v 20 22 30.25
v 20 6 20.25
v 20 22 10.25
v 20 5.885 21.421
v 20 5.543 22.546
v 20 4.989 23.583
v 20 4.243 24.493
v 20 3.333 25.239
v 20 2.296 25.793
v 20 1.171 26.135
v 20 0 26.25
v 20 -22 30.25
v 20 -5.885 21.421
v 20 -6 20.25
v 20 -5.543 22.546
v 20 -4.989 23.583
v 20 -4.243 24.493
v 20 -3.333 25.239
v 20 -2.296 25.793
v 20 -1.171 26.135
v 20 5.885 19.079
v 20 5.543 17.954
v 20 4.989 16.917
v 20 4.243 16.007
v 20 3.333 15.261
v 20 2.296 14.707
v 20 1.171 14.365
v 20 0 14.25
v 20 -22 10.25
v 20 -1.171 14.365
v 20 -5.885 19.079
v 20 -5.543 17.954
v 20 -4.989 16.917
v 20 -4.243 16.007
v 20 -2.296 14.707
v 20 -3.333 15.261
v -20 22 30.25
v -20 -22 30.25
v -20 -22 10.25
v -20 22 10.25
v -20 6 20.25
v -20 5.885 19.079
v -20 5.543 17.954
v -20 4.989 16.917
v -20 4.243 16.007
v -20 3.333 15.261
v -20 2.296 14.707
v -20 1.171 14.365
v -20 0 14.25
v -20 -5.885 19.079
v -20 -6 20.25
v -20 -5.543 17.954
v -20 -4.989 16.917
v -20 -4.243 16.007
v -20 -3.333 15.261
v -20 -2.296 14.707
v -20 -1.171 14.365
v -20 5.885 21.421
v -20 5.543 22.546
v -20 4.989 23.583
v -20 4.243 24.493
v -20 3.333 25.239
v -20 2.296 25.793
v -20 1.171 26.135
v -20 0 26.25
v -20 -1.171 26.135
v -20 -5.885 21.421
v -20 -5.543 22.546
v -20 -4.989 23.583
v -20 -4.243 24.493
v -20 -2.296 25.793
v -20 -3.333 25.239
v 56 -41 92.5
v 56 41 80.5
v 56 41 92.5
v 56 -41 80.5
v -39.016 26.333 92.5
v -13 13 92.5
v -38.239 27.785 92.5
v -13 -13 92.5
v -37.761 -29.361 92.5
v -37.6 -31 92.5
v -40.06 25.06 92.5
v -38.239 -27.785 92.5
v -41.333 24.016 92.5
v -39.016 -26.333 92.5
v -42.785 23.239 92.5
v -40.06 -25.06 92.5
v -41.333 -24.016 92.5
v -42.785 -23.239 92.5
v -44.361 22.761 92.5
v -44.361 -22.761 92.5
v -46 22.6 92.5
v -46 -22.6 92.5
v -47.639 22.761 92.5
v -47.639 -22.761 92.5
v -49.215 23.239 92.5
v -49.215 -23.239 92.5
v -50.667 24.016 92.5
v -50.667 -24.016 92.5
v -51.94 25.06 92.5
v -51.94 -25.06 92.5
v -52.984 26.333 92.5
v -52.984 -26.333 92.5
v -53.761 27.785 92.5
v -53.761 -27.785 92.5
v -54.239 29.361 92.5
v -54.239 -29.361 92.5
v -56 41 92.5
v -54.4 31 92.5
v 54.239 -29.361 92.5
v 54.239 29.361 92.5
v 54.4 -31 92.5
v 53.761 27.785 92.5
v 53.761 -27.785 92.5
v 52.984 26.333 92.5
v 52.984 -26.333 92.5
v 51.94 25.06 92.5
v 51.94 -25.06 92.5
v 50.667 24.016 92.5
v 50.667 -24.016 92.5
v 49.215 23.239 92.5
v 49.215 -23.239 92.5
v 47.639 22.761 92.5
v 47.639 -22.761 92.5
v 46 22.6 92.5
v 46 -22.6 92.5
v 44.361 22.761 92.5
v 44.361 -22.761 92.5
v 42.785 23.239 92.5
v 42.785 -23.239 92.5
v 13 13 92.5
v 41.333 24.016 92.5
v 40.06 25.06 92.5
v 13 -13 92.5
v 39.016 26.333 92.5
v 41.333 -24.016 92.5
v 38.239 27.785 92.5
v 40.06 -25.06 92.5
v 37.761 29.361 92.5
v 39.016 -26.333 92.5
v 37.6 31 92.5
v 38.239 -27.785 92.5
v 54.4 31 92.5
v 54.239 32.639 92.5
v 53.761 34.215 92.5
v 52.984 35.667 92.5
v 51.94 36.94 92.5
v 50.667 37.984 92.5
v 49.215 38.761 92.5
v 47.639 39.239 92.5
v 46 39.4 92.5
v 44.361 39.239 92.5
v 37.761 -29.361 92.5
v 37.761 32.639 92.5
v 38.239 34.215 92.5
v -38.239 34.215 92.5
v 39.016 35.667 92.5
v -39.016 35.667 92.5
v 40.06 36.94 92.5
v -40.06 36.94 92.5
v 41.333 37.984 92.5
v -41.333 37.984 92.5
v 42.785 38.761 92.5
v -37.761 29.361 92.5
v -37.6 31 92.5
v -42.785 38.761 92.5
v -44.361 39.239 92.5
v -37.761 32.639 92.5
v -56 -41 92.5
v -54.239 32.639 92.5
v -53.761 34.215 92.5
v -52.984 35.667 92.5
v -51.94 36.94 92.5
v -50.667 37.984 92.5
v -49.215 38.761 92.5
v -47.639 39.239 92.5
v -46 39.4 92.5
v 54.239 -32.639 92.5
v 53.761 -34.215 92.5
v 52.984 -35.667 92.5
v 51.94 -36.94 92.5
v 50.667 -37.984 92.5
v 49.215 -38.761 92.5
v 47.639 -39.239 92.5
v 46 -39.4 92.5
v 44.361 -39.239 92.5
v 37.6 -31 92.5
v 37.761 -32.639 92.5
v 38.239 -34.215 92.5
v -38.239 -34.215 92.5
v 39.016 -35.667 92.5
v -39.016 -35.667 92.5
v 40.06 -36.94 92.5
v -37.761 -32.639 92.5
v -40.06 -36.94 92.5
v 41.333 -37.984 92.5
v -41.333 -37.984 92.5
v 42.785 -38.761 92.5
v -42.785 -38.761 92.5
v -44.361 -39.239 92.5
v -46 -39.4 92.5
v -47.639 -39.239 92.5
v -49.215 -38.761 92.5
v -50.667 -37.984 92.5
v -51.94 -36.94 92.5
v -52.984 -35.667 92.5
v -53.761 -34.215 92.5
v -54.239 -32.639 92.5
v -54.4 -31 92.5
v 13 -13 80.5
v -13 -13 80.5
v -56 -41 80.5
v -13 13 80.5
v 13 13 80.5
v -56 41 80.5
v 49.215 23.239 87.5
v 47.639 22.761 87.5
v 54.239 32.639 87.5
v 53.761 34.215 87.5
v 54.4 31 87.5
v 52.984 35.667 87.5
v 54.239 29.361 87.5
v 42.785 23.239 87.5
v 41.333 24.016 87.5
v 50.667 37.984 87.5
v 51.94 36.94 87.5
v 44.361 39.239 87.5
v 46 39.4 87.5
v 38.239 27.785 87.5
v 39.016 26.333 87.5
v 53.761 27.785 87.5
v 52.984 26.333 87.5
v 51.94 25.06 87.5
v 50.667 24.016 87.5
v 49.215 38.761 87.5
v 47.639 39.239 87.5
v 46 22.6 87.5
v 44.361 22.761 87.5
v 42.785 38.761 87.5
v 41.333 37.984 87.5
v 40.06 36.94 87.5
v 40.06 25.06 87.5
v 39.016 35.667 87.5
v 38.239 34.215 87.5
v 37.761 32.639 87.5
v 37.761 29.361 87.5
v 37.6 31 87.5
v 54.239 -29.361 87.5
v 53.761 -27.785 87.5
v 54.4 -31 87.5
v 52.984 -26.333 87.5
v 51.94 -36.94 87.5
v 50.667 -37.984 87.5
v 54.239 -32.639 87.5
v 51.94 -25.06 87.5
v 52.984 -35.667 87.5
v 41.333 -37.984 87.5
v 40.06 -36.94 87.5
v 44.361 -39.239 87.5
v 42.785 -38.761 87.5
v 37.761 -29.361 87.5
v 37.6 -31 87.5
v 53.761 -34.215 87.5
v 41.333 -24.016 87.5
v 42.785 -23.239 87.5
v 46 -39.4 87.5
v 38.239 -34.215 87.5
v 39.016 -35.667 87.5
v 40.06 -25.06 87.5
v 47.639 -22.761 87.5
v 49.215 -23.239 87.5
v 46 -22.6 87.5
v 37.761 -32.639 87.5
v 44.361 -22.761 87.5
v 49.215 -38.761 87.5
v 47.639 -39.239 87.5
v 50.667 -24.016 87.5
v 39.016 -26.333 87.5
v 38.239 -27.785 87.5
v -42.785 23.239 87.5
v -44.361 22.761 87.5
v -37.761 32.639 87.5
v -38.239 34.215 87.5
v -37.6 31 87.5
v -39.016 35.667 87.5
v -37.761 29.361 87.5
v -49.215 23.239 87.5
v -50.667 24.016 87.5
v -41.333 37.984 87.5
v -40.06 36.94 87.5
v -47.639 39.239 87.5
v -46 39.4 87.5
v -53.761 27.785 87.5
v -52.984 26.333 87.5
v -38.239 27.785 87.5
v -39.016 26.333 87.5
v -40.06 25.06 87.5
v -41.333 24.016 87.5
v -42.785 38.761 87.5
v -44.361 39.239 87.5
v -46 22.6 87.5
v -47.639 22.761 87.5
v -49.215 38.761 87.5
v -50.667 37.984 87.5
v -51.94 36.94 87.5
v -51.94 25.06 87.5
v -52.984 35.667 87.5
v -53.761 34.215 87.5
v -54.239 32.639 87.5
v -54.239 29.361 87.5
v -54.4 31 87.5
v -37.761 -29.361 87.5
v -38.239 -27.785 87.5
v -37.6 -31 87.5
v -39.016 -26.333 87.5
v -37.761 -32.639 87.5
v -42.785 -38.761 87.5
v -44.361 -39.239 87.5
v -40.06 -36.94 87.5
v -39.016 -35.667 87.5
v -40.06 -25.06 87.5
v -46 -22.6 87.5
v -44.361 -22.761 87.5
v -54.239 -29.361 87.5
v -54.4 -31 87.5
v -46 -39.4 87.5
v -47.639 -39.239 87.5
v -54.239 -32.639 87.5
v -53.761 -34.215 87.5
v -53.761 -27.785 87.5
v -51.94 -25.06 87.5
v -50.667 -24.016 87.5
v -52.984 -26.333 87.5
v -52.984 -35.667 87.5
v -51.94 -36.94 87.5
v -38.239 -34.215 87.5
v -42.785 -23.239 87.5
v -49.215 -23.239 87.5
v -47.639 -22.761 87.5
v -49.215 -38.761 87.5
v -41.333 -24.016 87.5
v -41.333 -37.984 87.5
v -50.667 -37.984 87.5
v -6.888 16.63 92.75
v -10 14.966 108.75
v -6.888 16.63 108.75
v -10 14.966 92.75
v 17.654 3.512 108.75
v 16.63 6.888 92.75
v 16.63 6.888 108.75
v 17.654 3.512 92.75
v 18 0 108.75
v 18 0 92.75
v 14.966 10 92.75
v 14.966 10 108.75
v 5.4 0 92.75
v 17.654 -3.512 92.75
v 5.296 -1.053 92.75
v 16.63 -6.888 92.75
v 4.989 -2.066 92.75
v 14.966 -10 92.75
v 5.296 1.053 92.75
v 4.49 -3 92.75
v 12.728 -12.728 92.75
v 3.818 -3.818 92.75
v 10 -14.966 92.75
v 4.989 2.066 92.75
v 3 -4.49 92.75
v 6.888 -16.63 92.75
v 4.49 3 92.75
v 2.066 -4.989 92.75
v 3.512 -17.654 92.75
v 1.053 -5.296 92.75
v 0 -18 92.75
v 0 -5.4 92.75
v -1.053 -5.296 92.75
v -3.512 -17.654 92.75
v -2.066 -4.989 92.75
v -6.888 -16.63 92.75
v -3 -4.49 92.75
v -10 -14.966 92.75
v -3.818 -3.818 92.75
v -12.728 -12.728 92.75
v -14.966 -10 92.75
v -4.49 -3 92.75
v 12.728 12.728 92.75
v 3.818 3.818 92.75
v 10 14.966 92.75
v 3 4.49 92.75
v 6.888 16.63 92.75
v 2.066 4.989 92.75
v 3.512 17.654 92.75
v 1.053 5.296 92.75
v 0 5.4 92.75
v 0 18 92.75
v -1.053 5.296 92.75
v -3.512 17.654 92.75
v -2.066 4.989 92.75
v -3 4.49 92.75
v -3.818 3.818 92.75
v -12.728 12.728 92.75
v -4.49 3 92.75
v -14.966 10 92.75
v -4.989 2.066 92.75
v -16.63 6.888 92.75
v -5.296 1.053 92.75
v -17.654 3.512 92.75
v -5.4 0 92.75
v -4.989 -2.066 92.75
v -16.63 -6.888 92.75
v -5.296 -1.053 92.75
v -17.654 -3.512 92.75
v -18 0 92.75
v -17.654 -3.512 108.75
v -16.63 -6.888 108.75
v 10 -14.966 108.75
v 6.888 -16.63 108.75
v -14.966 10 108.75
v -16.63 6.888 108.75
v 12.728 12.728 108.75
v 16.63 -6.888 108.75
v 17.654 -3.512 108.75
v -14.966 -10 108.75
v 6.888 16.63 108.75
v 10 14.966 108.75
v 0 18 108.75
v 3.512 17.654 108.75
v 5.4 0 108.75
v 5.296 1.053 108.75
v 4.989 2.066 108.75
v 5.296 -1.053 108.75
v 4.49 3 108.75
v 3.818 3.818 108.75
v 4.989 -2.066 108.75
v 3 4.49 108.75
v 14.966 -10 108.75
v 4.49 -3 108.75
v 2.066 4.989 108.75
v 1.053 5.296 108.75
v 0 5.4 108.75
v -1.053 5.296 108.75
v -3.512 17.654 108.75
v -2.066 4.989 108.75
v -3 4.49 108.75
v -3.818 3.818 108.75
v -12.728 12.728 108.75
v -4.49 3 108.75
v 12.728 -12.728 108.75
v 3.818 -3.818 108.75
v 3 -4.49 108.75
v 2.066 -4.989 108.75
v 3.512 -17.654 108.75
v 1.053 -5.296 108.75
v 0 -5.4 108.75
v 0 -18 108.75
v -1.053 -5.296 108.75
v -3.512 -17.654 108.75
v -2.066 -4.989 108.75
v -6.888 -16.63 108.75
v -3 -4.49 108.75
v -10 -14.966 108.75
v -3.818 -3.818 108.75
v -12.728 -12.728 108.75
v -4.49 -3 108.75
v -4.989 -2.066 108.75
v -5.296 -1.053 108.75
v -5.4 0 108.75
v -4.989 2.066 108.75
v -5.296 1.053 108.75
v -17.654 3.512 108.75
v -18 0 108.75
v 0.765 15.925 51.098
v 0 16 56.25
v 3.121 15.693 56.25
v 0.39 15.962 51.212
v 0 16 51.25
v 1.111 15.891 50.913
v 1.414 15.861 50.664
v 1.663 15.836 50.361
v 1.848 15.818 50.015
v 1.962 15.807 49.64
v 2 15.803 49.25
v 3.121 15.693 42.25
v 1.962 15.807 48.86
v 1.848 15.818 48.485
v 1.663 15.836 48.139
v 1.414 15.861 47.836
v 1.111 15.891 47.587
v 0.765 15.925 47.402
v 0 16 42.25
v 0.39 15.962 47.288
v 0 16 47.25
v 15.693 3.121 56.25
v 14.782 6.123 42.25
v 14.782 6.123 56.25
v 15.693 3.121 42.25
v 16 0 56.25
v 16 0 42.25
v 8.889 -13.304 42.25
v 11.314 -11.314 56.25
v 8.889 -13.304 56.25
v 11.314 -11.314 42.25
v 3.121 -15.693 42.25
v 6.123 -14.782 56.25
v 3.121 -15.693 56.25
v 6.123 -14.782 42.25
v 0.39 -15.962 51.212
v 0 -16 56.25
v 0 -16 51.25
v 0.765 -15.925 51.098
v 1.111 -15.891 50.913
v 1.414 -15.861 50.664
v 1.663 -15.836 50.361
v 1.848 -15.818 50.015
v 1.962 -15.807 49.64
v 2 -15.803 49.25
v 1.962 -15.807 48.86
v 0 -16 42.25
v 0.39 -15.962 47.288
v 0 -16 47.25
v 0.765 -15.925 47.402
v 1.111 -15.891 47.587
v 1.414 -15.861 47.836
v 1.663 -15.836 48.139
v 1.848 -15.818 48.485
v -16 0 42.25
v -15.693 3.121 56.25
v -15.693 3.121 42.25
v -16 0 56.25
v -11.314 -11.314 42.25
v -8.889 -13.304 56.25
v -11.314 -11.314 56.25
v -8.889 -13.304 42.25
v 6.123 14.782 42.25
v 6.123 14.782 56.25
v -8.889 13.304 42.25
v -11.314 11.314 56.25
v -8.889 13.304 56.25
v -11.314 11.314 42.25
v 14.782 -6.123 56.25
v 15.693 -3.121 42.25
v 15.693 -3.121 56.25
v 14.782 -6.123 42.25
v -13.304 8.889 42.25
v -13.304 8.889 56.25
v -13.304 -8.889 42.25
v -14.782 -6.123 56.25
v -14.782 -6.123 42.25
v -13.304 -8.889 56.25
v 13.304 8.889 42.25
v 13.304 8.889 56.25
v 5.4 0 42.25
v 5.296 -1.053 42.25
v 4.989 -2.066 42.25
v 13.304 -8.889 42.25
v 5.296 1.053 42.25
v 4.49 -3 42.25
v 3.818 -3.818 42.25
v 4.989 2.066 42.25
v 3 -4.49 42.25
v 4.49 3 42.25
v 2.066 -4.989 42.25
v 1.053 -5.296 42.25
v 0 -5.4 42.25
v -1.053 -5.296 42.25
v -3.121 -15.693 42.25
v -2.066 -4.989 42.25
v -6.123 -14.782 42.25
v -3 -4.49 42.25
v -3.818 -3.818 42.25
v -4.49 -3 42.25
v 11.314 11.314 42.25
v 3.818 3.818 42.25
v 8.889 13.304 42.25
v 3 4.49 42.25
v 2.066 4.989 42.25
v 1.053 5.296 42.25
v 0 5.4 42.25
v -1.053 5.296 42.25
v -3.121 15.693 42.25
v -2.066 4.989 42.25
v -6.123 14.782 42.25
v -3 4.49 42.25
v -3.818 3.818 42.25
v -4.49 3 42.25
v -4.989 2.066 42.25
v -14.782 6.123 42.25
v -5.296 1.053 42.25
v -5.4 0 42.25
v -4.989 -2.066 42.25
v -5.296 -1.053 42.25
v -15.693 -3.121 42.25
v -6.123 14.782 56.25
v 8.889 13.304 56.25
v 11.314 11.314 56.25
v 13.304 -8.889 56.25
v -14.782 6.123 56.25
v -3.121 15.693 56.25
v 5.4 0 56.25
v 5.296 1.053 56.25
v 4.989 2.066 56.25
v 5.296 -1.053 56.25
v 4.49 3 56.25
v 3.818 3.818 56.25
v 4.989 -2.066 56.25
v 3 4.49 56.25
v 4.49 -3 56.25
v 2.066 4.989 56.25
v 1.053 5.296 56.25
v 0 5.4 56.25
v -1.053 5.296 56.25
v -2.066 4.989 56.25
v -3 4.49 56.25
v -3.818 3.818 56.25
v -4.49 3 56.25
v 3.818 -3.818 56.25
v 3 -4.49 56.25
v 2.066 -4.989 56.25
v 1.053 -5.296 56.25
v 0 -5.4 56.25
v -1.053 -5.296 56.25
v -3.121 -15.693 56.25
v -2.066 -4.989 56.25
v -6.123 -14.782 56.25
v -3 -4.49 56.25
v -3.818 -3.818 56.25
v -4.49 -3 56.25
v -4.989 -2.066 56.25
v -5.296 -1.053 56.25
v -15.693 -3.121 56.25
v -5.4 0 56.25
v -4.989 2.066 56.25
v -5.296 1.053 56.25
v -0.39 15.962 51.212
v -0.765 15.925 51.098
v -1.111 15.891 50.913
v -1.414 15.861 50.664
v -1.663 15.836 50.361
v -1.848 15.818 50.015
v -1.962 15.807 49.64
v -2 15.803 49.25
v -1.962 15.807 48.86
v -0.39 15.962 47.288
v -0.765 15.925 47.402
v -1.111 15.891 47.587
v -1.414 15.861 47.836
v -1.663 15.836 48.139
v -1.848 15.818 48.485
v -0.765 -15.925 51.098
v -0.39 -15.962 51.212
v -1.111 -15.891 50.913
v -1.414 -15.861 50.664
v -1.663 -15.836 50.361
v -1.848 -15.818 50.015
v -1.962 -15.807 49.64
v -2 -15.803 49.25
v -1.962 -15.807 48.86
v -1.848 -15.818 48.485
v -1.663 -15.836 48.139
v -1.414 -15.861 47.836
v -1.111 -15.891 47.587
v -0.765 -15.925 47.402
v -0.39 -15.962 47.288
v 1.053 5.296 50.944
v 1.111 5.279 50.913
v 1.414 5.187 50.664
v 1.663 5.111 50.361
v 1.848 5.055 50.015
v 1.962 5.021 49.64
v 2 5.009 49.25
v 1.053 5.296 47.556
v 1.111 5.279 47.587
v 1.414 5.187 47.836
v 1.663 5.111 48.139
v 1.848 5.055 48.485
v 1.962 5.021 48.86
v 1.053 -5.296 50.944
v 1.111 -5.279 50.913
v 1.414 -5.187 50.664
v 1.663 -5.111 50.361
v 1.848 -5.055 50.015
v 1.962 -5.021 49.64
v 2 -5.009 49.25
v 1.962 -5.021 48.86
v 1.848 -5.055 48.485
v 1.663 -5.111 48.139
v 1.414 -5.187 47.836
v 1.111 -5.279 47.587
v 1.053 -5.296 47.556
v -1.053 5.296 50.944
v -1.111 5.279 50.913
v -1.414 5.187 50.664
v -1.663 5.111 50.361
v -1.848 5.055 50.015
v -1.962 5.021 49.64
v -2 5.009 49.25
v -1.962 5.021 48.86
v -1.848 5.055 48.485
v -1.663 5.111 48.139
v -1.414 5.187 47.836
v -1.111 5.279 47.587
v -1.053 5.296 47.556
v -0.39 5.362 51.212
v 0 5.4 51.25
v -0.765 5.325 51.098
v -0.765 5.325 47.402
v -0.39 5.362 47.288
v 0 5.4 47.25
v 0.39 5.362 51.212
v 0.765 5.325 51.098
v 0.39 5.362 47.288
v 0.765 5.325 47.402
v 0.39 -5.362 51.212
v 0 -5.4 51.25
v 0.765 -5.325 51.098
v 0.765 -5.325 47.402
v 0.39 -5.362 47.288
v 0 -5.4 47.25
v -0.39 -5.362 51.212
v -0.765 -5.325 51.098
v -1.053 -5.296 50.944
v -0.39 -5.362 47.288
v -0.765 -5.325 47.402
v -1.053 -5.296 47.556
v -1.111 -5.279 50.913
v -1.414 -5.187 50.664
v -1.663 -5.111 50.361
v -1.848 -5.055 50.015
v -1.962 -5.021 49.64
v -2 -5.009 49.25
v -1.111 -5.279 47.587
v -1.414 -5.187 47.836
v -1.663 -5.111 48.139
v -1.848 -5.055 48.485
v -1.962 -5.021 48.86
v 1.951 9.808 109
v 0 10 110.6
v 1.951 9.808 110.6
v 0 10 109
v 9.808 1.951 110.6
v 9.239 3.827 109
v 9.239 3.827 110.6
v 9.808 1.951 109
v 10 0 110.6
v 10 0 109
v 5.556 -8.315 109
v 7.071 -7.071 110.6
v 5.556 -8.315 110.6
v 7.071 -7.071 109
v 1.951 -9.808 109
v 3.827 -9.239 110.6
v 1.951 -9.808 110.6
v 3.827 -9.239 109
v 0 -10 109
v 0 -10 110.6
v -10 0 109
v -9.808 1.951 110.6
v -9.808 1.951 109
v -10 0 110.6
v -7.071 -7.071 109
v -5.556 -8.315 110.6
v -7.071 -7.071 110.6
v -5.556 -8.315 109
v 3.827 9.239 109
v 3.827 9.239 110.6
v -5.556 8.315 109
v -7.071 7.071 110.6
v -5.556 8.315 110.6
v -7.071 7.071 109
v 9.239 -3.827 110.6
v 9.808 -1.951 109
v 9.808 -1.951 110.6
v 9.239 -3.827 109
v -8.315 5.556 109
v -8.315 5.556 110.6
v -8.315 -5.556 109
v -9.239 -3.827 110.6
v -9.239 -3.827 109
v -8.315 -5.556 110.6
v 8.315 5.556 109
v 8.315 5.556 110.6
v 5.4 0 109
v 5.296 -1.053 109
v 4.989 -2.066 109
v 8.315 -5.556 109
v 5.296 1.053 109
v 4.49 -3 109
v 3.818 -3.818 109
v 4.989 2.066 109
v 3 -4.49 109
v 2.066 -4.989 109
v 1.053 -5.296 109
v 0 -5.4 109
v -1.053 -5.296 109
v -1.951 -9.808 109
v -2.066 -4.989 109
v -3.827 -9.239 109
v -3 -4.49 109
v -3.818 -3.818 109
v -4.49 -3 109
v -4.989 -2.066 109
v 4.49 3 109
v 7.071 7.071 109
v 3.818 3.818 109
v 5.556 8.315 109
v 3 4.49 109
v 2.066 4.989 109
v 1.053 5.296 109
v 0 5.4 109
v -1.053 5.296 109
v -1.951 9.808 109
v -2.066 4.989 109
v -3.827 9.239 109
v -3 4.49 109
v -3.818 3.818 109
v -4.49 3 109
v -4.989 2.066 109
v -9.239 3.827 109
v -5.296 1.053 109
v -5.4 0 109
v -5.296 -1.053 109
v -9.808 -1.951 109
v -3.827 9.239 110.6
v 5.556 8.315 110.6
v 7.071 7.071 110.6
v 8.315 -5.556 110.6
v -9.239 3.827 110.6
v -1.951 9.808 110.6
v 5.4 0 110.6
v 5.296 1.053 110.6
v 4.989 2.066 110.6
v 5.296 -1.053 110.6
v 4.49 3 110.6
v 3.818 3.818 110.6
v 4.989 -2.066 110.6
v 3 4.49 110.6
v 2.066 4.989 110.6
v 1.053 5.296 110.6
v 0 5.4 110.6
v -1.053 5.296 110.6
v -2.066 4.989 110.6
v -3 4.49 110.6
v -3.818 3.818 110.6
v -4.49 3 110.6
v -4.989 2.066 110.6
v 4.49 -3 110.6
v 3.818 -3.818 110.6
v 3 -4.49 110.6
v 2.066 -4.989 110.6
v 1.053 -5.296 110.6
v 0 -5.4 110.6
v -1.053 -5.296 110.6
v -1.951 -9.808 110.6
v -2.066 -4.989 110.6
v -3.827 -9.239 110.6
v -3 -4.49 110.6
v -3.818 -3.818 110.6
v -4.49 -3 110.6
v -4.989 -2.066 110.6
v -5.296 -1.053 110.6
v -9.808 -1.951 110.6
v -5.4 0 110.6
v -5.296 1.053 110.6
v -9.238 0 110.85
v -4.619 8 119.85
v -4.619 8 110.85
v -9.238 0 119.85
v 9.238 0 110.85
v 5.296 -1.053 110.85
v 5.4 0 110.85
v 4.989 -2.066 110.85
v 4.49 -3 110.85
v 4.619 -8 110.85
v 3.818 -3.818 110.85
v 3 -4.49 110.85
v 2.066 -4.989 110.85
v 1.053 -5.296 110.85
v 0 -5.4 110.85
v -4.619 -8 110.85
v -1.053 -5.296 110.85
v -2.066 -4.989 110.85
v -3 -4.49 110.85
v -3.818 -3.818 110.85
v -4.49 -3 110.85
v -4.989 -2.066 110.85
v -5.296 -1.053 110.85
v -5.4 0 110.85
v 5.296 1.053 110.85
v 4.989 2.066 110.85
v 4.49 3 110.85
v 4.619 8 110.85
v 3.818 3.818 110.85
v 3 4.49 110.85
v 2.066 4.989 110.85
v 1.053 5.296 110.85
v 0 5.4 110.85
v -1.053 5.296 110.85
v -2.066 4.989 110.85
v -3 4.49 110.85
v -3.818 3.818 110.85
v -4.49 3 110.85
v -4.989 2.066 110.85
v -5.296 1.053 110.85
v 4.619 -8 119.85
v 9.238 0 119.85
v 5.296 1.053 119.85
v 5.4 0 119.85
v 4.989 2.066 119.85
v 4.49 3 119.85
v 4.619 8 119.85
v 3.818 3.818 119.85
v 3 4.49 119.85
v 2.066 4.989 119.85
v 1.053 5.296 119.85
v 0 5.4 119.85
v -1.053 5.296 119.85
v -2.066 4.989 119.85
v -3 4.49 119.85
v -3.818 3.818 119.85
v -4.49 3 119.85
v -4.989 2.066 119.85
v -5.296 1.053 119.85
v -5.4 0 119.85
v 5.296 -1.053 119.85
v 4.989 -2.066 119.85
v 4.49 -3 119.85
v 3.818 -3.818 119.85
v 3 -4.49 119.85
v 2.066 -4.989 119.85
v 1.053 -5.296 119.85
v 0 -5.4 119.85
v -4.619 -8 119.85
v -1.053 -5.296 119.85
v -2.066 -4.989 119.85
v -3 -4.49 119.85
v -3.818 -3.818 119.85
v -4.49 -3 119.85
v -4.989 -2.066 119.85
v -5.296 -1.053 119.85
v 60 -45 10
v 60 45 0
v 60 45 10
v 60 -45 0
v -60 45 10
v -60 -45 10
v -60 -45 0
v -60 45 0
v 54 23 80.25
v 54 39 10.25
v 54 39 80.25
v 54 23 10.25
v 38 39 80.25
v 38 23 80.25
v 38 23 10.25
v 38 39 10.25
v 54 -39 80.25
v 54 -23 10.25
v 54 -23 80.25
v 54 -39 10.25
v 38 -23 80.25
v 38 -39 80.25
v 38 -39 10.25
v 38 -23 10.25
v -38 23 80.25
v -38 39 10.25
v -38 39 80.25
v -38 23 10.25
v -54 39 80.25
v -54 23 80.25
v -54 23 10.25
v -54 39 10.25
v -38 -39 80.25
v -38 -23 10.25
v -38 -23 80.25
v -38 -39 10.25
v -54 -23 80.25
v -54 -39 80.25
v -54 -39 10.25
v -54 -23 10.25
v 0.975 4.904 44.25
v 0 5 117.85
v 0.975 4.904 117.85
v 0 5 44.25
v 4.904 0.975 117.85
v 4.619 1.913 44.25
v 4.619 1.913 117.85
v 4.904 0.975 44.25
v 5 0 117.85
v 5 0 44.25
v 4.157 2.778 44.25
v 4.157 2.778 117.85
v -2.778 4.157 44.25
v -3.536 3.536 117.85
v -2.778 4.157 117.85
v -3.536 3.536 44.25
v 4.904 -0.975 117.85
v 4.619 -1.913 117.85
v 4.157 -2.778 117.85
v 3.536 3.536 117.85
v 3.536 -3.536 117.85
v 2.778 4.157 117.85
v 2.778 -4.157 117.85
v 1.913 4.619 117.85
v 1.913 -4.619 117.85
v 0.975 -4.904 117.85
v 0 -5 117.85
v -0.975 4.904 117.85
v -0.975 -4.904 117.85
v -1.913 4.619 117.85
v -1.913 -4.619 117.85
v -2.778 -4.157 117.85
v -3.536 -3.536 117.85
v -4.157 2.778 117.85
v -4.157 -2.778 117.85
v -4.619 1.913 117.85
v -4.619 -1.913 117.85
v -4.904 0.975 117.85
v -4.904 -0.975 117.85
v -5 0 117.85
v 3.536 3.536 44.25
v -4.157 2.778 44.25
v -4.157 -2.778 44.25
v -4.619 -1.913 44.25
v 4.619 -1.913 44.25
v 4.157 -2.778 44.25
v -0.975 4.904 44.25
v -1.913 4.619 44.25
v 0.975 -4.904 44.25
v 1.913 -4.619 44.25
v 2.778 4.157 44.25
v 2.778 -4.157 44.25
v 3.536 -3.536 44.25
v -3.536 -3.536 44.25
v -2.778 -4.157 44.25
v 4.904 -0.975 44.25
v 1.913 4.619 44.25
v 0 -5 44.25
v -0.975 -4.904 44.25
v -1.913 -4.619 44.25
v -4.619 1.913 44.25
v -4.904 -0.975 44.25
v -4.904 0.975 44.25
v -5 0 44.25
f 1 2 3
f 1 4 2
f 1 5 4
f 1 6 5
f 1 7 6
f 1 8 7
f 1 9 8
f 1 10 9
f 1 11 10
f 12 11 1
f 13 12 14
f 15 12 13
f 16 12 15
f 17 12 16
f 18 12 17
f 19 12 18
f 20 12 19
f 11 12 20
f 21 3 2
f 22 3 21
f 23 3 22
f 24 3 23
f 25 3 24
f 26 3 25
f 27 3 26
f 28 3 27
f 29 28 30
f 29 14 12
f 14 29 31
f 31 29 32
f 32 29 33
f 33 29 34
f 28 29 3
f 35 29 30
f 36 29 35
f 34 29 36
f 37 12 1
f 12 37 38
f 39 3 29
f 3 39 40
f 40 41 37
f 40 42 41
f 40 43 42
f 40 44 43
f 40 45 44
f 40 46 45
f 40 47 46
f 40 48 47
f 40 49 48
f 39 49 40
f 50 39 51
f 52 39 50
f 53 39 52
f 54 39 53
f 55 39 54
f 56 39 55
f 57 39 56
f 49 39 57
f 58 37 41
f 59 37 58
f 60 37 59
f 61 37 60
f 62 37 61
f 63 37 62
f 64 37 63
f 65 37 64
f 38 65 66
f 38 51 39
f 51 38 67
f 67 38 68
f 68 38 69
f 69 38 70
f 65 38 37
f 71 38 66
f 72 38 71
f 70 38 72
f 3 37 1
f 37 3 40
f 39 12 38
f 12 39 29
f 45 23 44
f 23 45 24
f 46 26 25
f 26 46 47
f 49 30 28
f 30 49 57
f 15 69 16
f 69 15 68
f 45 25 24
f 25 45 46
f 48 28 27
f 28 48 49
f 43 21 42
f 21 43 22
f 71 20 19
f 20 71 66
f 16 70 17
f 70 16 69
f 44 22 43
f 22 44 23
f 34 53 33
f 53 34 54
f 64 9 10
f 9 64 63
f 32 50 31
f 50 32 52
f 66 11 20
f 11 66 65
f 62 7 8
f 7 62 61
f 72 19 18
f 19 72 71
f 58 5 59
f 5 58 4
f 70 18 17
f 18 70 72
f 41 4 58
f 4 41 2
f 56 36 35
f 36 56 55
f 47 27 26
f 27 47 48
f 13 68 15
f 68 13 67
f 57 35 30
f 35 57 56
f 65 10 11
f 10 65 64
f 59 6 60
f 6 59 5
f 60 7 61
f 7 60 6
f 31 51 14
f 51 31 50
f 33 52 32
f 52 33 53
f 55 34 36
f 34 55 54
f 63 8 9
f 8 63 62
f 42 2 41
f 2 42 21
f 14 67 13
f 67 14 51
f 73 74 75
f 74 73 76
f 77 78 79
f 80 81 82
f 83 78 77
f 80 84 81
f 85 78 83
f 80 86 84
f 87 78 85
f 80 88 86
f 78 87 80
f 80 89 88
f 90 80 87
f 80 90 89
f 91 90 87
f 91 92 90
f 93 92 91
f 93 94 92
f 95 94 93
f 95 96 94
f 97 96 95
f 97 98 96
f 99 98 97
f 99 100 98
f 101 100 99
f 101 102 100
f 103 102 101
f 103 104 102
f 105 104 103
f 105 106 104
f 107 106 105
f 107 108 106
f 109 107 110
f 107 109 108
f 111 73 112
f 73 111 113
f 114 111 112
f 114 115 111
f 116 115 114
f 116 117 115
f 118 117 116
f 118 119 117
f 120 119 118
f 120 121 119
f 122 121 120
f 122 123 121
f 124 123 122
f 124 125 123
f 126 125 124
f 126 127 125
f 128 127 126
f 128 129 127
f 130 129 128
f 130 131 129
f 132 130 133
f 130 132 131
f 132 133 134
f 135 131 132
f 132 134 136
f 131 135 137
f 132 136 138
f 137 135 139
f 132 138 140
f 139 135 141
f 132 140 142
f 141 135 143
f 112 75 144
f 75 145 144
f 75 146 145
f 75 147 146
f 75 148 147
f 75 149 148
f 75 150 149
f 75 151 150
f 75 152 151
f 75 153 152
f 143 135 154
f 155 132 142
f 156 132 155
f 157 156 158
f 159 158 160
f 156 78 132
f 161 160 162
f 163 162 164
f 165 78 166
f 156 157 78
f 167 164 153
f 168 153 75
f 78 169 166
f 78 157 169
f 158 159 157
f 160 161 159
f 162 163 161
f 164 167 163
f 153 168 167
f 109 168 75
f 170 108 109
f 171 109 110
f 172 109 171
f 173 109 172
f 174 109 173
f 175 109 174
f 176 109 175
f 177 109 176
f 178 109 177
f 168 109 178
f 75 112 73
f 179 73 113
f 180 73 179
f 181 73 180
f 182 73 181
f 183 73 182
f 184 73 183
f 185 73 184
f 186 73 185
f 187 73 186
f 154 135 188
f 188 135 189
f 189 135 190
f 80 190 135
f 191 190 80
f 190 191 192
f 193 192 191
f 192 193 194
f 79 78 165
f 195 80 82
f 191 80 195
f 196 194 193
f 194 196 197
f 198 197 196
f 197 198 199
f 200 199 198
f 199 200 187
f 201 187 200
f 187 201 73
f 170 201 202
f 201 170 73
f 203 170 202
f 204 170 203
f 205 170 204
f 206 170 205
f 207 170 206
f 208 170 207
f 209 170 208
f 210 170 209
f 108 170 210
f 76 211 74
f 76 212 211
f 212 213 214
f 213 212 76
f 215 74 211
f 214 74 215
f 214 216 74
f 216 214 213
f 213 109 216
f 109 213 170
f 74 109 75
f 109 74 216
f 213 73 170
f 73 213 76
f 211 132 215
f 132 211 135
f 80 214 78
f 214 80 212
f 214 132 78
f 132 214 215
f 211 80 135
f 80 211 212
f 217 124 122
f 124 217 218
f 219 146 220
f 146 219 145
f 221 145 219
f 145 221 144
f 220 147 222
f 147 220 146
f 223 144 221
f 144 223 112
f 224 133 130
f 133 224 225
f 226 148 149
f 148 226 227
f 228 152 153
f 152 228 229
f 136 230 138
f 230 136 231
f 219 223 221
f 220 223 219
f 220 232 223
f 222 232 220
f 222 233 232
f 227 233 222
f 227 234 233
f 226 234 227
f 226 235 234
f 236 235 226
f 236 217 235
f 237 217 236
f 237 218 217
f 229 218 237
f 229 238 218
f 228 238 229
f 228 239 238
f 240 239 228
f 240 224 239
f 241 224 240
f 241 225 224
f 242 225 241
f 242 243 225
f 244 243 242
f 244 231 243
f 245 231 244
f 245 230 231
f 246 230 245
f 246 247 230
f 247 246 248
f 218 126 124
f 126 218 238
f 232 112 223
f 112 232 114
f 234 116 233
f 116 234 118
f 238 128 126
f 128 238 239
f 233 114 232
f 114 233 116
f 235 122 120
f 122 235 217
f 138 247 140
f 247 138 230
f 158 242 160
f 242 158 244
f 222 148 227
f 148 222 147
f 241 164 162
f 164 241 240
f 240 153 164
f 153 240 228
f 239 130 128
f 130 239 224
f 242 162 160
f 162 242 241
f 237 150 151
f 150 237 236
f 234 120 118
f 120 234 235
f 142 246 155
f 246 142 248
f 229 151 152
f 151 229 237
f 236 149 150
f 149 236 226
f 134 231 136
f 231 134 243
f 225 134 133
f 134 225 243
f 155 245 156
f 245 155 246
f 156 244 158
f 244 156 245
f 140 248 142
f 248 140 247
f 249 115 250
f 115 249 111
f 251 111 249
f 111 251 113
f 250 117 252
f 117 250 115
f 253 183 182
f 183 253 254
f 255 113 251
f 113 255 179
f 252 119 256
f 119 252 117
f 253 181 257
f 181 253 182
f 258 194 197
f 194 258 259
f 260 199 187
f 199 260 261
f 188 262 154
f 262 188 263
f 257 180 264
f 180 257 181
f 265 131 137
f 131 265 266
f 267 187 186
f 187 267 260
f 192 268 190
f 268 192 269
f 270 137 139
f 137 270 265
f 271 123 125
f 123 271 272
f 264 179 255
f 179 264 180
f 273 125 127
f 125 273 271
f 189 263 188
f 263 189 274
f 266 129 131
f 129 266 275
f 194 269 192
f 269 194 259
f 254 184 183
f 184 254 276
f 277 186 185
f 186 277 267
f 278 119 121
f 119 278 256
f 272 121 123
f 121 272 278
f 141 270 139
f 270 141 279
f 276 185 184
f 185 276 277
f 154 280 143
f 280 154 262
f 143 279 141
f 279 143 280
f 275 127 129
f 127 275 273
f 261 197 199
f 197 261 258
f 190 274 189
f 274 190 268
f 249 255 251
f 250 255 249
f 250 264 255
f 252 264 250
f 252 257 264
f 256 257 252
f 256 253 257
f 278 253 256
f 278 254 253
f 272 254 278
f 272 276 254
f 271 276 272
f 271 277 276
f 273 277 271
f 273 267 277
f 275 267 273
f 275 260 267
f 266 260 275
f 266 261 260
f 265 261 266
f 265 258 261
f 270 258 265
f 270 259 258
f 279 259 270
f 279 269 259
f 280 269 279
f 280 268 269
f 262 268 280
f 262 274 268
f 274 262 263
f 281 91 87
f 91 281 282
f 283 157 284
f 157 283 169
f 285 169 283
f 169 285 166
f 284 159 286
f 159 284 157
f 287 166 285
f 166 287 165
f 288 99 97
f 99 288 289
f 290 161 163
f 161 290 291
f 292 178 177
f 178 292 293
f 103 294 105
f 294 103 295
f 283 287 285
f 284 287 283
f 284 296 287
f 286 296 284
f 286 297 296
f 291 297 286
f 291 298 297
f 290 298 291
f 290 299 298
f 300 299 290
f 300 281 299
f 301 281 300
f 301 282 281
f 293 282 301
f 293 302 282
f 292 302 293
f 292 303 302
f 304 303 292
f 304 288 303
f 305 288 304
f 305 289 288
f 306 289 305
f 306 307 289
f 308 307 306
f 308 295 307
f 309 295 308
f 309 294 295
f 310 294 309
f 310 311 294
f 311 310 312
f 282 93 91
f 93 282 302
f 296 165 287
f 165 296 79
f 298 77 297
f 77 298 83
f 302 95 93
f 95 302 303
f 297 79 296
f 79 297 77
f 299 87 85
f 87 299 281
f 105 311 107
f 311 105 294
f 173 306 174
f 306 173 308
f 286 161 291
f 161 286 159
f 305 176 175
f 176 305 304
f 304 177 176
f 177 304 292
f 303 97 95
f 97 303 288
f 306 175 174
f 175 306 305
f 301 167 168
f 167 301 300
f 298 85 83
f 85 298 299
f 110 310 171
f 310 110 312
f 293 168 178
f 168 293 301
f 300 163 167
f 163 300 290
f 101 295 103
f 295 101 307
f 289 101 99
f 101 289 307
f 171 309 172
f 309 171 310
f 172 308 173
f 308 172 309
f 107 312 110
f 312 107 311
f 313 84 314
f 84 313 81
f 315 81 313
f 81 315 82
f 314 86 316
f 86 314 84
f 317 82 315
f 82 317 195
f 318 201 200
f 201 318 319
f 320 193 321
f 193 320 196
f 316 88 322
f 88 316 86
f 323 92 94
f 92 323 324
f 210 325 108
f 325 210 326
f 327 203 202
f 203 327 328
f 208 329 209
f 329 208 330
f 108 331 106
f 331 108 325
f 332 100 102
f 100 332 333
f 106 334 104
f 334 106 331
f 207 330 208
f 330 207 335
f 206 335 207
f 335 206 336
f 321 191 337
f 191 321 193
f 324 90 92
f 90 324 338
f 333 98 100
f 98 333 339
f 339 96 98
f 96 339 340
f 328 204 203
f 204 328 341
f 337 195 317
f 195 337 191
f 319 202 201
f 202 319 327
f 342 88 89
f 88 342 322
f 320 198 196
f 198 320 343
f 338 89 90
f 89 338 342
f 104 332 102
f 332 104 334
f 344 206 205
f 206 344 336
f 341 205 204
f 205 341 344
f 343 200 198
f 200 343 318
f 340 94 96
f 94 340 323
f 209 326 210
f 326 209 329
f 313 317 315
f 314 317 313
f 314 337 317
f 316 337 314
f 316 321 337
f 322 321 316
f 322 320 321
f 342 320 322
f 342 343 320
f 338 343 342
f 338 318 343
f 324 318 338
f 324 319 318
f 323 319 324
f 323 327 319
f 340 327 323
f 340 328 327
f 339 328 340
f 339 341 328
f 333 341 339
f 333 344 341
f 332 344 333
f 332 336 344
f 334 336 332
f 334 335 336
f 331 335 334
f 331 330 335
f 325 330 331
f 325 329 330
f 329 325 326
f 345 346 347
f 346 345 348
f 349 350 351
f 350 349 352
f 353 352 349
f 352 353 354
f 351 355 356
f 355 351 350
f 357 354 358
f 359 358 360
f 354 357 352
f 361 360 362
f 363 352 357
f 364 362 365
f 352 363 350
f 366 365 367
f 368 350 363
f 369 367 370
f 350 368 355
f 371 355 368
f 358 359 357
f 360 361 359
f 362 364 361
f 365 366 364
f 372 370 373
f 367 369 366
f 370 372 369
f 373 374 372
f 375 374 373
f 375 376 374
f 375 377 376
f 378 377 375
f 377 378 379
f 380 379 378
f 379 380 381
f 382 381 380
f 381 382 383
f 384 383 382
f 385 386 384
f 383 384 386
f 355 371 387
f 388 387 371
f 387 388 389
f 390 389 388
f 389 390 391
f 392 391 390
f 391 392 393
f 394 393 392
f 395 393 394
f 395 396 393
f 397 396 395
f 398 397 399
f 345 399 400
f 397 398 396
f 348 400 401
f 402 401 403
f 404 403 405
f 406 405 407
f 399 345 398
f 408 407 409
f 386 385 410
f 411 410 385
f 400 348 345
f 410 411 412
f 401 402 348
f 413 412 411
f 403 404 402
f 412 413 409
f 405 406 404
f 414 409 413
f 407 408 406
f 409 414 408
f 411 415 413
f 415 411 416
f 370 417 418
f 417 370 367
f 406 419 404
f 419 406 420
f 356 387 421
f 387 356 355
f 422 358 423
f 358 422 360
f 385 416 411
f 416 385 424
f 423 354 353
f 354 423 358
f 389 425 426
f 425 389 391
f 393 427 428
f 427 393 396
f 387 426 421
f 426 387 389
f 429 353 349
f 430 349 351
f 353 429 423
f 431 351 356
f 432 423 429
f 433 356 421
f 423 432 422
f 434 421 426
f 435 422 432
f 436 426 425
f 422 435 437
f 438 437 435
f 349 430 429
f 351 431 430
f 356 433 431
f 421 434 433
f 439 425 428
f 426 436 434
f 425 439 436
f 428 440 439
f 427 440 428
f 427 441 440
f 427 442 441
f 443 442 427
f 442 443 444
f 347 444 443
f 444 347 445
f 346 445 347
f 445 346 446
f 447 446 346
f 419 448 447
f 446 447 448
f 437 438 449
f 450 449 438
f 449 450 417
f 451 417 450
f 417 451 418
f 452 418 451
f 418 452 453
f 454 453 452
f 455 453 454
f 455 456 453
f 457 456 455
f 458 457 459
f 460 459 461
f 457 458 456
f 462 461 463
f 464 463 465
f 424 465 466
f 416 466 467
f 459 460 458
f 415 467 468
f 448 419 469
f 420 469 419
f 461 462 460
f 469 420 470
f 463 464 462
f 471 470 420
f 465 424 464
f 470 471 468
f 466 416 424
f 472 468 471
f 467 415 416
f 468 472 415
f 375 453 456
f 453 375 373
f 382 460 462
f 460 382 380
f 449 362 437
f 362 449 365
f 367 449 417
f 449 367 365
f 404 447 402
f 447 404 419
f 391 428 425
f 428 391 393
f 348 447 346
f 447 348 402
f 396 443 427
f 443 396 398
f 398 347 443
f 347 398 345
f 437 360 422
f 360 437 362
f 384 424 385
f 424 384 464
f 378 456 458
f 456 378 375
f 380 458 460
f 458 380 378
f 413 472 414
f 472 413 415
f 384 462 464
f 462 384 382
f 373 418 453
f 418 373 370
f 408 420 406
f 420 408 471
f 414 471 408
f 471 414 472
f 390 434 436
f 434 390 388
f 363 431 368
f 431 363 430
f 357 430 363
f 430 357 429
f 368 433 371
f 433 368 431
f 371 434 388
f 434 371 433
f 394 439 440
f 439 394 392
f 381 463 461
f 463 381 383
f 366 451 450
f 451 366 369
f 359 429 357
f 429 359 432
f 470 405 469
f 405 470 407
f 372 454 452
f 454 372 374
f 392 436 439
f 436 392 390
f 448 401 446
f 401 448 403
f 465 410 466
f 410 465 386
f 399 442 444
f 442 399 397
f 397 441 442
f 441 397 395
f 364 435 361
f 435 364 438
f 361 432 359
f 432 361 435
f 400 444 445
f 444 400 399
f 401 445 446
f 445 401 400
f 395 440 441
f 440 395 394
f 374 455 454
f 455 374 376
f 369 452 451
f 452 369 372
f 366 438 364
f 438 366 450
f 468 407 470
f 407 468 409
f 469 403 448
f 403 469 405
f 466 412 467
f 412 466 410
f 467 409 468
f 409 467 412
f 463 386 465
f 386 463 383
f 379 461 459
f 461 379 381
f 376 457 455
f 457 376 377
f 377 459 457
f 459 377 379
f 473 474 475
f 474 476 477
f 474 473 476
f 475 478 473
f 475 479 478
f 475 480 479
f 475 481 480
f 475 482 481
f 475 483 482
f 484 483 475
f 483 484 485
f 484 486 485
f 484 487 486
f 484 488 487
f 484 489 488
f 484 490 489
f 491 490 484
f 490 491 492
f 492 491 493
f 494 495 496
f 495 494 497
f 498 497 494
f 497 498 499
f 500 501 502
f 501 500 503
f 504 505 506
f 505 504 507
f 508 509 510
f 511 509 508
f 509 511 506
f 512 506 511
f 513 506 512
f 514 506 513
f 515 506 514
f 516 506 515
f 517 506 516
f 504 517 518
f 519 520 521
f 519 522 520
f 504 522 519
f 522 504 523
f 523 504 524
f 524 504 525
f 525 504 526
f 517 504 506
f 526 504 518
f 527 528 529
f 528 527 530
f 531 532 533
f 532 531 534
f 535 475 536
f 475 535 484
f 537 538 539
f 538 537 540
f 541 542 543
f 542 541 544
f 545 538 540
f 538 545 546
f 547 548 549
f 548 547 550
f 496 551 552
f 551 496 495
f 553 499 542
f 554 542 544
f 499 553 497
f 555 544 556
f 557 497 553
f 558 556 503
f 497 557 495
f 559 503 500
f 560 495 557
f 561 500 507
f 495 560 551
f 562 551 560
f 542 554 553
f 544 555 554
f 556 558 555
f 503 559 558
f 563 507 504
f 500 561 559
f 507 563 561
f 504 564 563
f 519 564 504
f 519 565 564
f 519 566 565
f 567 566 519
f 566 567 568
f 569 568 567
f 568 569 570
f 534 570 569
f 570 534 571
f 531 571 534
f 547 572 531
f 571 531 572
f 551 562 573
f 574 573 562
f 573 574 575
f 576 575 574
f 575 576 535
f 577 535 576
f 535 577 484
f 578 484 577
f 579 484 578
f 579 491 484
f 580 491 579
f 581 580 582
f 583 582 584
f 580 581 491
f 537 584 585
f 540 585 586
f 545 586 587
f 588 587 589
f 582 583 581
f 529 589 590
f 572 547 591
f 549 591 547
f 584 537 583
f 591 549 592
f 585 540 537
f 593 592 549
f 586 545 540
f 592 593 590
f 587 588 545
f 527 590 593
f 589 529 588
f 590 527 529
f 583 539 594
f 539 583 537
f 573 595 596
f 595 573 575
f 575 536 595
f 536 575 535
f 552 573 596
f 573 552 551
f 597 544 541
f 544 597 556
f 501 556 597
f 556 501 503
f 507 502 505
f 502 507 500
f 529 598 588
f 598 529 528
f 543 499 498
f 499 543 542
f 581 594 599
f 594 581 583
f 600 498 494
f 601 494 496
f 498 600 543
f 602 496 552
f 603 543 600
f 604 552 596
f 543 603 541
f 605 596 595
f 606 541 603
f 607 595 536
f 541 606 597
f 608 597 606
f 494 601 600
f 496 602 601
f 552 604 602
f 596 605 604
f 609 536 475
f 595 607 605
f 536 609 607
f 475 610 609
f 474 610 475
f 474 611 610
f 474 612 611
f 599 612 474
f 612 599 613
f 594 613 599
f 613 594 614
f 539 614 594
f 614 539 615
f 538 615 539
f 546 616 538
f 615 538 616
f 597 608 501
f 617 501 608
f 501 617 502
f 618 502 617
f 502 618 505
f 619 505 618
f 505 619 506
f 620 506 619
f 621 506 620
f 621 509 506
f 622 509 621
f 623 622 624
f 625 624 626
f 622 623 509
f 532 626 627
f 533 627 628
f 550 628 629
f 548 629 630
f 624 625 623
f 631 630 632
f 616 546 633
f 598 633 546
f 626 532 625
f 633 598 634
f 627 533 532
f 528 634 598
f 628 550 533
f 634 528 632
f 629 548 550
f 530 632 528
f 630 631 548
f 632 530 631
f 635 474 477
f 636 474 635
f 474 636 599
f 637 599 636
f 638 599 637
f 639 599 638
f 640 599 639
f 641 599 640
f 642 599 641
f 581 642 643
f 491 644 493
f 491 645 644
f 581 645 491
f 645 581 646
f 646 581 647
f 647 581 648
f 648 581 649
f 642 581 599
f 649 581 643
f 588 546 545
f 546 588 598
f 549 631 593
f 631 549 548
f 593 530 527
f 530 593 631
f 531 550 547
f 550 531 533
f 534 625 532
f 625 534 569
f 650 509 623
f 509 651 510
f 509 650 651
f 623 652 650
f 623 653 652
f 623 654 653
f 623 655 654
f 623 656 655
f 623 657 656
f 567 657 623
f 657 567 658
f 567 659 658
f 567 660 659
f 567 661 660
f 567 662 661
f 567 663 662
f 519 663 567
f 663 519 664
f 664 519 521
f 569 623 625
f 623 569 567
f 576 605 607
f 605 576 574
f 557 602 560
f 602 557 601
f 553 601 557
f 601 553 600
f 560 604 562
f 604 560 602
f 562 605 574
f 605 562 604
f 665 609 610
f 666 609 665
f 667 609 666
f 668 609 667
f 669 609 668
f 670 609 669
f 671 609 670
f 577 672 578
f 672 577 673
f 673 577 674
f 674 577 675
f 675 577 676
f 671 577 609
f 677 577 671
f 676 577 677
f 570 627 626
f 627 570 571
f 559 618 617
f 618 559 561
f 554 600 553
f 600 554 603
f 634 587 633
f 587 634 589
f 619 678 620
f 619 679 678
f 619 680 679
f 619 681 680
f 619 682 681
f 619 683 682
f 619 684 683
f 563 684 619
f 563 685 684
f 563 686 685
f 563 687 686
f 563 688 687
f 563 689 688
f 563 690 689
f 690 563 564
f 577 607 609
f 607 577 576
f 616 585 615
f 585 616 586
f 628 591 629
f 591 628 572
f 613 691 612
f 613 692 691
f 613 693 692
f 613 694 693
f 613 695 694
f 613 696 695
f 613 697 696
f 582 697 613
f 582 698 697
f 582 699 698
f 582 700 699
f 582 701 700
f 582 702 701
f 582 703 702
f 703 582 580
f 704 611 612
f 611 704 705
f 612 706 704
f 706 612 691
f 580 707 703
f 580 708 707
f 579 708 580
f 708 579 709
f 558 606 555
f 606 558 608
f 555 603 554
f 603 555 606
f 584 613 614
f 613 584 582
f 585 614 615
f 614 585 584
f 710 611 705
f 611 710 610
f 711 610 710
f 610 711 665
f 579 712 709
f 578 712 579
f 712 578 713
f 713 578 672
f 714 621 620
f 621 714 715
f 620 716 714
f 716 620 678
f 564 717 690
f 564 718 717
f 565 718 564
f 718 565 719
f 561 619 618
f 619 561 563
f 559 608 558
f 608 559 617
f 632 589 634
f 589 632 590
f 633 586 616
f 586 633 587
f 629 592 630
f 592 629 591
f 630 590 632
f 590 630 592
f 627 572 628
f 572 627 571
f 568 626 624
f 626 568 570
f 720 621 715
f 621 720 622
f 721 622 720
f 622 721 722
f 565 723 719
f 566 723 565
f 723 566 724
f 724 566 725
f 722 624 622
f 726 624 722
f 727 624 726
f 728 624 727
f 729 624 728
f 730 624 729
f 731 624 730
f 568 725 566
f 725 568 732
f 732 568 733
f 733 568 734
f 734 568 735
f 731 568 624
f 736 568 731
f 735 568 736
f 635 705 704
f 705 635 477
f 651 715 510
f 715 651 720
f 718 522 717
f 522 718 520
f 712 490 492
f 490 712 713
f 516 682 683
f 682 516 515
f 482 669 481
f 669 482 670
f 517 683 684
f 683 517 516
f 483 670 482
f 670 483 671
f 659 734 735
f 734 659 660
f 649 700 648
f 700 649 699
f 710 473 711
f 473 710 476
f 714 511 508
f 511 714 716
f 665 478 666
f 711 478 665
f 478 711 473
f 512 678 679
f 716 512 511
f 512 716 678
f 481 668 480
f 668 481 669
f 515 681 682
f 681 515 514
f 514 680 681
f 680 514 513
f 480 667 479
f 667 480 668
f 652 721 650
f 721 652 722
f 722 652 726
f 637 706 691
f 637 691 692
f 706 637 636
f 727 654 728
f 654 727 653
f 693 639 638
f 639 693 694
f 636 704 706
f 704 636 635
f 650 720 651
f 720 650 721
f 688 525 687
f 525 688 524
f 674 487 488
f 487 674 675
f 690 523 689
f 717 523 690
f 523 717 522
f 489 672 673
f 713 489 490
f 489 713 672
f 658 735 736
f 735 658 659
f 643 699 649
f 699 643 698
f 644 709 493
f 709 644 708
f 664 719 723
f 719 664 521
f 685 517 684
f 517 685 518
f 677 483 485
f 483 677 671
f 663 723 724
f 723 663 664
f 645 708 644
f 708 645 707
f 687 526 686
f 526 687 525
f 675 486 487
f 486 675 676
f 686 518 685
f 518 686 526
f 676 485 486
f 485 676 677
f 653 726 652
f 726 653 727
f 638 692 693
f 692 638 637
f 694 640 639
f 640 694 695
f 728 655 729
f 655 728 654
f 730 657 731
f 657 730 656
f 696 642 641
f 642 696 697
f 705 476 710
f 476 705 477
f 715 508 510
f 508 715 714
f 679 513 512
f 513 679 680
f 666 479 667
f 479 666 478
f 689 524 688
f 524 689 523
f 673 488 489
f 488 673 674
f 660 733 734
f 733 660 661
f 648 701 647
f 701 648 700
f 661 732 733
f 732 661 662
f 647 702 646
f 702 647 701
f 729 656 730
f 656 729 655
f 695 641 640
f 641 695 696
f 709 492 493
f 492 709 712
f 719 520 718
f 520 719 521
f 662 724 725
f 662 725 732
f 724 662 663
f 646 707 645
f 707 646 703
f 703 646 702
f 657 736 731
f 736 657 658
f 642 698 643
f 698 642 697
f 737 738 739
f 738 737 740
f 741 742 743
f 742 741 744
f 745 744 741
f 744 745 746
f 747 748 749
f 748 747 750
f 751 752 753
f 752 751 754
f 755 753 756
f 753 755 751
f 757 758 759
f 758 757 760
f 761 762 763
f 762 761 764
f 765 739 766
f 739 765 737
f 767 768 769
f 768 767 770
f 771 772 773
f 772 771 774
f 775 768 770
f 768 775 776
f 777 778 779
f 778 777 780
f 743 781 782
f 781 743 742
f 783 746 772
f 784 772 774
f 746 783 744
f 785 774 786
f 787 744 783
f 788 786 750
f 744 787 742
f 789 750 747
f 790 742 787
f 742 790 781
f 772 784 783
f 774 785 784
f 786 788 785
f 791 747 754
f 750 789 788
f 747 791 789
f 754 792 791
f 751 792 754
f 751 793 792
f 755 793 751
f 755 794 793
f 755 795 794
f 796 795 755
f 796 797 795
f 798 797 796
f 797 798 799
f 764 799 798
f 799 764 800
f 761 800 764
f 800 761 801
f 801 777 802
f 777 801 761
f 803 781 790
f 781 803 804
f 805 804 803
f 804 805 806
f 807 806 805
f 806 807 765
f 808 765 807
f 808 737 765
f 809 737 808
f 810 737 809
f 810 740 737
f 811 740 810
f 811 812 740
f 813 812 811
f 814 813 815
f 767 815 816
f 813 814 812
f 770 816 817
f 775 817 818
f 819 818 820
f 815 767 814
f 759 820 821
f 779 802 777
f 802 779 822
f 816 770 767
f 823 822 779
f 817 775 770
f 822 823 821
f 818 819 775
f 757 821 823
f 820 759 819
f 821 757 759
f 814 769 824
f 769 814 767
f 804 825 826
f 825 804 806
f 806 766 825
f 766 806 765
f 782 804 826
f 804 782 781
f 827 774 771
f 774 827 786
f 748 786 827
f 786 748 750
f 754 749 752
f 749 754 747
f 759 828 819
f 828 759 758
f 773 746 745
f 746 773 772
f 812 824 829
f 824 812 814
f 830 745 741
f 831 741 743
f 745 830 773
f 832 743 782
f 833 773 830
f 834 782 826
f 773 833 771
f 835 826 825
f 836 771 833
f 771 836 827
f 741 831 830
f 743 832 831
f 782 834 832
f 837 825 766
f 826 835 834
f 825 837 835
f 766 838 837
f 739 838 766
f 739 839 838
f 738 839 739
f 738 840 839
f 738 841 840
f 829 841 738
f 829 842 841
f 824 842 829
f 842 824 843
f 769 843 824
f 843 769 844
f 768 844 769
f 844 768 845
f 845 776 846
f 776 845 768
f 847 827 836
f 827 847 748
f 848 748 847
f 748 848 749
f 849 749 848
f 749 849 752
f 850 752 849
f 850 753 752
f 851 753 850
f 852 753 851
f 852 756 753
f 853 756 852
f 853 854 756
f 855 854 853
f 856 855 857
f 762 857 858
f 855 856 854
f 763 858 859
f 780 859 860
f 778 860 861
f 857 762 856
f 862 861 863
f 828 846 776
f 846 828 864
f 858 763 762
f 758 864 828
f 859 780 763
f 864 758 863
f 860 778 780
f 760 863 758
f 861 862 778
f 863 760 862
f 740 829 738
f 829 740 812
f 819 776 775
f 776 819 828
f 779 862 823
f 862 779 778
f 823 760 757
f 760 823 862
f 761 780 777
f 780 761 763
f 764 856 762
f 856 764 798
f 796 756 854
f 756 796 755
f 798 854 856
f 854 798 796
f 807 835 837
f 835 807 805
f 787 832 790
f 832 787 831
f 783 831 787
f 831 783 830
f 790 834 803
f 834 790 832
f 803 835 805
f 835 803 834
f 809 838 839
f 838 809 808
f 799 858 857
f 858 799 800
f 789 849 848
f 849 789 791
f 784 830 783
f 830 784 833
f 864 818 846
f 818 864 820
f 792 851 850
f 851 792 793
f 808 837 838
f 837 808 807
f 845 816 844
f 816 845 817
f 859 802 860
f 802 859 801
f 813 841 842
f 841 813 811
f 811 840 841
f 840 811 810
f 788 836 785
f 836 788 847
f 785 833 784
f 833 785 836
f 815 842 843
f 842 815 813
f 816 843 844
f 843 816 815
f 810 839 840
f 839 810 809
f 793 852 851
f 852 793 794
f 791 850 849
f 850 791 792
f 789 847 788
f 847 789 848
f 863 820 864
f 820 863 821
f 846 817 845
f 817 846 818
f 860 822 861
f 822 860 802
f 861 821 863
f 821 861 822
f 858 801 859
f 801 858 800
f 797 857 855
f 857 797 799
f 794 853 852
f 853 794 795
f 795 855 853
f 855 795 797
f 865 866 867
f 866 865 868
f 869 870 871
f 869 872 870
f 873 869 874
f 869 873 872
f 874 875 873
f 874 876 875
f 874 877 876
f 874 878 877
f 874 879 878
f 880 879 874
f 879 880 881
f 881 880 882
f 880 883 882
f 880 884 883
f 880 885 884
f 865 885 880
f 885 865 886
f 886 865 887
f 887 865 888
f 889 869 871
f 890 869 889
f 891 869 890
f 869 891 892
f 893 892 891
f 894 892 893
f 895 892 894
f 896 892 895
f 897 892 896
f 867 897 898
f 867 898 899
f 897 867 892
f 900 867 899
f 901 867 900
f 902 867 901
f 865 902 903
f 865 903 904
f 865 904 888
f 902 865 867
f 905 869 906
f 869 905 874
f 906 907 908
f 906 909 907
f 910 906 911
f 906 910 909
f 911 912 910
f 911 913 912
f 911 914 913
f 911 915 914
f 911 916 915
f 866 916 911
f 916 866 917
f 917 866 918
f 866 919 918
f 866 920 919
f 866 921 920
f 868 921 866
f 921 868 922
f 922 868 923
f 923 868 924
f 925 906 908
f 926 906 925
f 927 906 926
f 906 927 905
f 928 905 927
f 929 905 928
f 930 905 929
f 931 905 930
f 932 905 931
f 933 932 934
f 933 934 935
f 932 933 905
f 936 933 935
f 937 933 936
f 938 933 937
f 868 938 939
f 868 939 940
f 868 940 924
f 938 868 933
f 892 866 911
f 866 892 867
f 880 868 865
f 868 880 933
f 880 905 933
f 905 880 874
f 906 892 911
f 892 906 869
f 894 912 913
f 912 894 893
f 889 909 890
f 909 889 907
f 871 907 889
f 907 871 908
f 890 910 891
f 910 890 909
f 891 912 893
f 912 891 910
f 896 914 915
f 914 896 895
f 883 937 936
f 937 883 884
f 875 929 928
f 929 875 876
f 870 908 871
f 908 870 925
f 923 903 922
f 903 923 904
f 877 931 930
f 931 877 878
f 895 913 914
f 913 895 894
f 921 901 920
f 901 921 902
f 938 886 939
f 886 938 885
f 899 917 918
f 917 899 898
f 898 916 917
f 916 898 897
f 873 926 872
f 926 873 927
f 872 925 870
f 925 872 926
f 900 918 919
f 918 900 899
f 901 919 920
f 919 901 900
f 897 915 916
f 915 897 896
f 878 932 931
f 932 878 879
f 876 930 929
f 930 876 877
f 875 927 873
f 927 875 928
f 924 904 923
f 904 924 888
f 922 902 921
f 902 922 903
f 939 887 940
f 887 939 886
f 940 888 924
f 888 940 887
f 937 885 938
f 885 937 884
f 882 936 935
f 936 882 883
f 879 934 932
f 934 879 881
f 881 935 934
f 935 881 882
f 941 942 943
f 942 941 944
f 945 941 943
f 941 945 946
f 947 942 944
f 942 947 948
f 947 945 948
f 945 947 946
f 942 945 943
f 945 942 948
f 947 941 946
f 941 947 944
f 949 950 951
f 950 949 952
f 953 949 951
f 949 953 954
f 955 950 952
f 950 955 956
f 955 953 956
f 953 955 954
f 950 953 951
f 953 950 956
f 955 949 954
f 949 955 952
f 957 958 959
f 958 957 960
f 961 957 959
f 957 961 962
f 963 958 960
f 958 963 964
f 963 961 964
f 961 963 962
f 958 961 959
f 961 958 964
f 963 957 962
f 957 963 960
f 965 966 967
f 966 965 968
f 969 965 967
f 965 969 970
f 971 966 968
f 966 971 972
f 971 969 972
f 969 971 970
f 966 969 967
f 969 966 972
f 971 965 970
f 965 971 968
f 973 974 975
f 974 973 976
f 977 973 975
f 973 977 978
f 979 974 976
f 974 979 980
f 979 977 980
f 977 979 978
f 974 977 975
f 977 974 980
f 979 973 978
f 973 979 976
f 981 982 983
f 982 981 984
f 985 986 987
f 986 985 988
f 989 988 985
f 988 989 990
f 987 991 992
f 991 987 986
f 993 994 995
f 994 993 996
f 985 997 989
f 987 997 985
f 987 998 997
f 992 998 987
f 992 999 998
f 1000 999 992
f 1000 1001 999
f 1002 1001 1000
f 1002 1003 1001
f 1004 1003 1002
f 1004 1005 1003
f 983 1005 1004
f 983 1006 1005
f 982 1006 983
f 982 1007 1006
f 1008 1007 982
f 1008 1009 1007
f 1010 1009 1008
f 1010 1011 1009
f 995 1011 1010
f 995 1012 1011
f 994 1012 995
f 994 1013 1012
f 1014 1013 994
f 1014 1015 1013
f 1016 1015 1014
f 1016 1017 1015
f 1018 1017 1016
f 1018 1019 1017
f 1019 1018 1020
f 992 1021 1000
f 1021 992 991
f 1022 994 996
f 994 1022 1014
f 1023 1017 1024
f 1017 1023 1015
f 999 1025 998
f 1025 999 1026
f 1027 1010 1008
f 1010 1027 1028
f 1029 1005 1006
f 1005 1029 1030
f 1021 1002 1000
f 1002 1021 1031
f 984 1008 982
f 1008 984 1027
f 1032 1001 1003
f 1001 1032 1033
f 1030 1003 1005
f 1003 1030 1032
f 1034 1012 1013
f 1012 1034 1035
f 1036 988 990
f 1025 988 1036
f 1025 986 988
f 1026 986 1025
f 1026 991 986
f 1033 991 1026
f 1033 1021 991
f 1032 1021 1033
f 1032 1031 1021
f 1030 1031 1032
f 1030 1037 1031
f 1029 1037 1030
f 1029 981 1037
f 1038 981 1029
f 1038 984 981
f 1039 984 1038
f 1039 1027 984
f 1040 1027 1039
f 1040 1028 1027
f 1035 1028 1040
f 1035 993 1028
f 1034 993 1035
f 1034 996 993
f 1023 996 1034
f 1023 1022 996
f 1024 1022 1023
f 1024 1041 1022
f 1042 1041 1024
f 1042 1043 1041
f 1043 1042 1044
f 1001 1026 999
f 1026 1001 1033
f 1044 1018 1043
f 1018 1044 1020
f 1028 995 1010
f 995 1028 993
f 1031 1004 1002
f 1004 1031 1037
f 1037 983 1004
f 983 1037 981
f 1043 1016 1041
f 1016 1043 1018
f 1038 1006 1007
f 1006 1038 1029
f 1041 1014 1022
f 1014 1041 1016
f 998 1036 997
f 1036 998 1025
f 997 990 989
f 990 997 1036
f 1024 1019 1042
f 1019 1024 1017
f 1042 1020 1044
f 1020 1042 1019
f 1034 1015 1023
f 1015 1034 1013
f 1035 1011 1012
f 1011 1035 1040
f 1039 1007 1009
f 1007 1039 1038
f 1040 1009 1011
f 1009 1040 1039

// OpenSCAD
$fn = 32;

// ------------------------------------------------------------------------
// Arbor press fixture: screw d10, posts 70 mm, gap 12 mm
// Every part is its own module, assembly() places every instance.
// ------------------------------------------------------------------------

// --- part 1 ---
module press_bed() {
  difference() {
    translate([-60, -45, 0]) cube([120, 90, 10]);
  }
}

// --- part 2 ---
module anvil_block() {
  difference() {
    translate([-20, -22, 0]) cube([40, 44, 20]);
    translate([0, 0, 10]) rotate([0, 90, 0]) cylinder(h = 42, d = 12, center = true);
  }
}

// --- part 3 ---
module press_post_a() {
  translate([-8, -8, 0]) cube([16, 16, 70]);
}

// --- part 4 ---
module press_post_b() {
  translate([-8, -8, 0]) cube([16, 16, 70]);
}

// --- part 5 ---
module press_post_c() {
  translate([-8, -8, 0]) cube([16, 16, 70]);
}

// --- part 6 ---
module press_post_d() {
  translate([-8, -8, 0]) cube([16, 16, 70]);
}

// --- part 7 ---
module press_frame() {
  difference() {
    translate([-56, -41, 0]) cube([112, 82, 12]);
    translate([-13, -13, -1]) cube([26, 26, 14]);
    translate([46, 31, 7]) cylinder(h = 6, d = 16.8);
    translate([46, -31, 7]) cylinder(h = 6, d = 16.8);
    translate([-46, 31, 7]) cylinder(h = 6, d = 16.8);
    translate([-46, -31, 7]) cylinder(h = 6, d = 16.8);
  }
}

// --- part 8 ---
module guide_ring() {
  difference() {
      translate([0, 0, 0]) cylinder(h = 16, d = 36);
      translate([0, 0, -1]) cylinder(h = 18, d = 10.8);
    }
}

// --- part 9 ---
module press_screw() {
  translate([0, 0, -36.8]) cylinder(h = 73.6, d = 10);
}

// --- part 10 ---
module press_head() {
  difference() {
    cylinder(h = 14, d = 32);
    translate([0, 0, -1]) cylinder(h = 16, d = 10.8);
    translate([0, 0, 7]) rotate([90, 0, 0]) cylinder(h = 34, d = 4, center = true);
  }
}

// --- part 11 ---
module nut_washer() {
  difference() {
      translate([0, 0, 0]) cylinder(h = 1.6, d = 20);
      translate([0, 0, -1]) cylinder(h = 3.6, d = 10.8);
    }
}

// --- part 12 ---
module press_nut() {
  difference() {
    linear_extrude(height = 9) polygon(points = [[9.238, 0], [4.619, 8], [-4.619, 8], [-9.238, 0], [-4.619, -8], [4.619, -8]]);
    translate([0, 0, -1]) cylinder(h = 11, d = 10.8);
  }
}

// --- assembly ---
module assembly() {
  color([0.80, 0.24, 0.20]) translate([0, 0, 0]) rotate([0, 0, 0]) press_bed();
  color([0.20, 0.45, 0.75]) translate([0, 0, 10.25]) rotate([0, 0, 0]) anvil_block();
  color([0.25, 0.62, 0.32]) translate([46, 31, 10.25]) rotate([0, 0, 0]) press_post_a();
  color([0.92, 0.70, 0.18]) translate([46, -31, 10.25]) rotate([0, 0, 0]) press_post_b();
  color([0.58, 0.35, 0.70]) translate([-46, 31, 10.25]) rotate([0, 0, 0]) press_post_c();
  color([0.16, 0.66, 0.66]) translate([-46, -31, 10.25]) rotate([0, 0, 0]) press_post_d();
  color([0.85, 0.48, 0.18]) translate([0, 0, 80.5]) rotate([0, 0, 0]) press_frame();
  color([0.55, 0.60, 0.65]) translate([0, 0, 92.75]) rotate([0, 0, 0]) guide_ring();
  color([0.75, 0.30, 0.55]) translate([0, 0, 81.05]) rotate([0, 0, 0]) press_screw();
  color([0.42, 0.52, 0.28]) translate([0, 0, 42.25]) rotate([0, 0, 0]) press_head();
  color([0.80, 0.24, 0.20]) translate([0, 0, 109]) rotate([0, 0, 0]) nut_washer();
  color([0.20, 0.45, 0.75]) translate([0, 0, 110.85]) rotate([0, 0, 0]) press_nut();
}

assembly();
